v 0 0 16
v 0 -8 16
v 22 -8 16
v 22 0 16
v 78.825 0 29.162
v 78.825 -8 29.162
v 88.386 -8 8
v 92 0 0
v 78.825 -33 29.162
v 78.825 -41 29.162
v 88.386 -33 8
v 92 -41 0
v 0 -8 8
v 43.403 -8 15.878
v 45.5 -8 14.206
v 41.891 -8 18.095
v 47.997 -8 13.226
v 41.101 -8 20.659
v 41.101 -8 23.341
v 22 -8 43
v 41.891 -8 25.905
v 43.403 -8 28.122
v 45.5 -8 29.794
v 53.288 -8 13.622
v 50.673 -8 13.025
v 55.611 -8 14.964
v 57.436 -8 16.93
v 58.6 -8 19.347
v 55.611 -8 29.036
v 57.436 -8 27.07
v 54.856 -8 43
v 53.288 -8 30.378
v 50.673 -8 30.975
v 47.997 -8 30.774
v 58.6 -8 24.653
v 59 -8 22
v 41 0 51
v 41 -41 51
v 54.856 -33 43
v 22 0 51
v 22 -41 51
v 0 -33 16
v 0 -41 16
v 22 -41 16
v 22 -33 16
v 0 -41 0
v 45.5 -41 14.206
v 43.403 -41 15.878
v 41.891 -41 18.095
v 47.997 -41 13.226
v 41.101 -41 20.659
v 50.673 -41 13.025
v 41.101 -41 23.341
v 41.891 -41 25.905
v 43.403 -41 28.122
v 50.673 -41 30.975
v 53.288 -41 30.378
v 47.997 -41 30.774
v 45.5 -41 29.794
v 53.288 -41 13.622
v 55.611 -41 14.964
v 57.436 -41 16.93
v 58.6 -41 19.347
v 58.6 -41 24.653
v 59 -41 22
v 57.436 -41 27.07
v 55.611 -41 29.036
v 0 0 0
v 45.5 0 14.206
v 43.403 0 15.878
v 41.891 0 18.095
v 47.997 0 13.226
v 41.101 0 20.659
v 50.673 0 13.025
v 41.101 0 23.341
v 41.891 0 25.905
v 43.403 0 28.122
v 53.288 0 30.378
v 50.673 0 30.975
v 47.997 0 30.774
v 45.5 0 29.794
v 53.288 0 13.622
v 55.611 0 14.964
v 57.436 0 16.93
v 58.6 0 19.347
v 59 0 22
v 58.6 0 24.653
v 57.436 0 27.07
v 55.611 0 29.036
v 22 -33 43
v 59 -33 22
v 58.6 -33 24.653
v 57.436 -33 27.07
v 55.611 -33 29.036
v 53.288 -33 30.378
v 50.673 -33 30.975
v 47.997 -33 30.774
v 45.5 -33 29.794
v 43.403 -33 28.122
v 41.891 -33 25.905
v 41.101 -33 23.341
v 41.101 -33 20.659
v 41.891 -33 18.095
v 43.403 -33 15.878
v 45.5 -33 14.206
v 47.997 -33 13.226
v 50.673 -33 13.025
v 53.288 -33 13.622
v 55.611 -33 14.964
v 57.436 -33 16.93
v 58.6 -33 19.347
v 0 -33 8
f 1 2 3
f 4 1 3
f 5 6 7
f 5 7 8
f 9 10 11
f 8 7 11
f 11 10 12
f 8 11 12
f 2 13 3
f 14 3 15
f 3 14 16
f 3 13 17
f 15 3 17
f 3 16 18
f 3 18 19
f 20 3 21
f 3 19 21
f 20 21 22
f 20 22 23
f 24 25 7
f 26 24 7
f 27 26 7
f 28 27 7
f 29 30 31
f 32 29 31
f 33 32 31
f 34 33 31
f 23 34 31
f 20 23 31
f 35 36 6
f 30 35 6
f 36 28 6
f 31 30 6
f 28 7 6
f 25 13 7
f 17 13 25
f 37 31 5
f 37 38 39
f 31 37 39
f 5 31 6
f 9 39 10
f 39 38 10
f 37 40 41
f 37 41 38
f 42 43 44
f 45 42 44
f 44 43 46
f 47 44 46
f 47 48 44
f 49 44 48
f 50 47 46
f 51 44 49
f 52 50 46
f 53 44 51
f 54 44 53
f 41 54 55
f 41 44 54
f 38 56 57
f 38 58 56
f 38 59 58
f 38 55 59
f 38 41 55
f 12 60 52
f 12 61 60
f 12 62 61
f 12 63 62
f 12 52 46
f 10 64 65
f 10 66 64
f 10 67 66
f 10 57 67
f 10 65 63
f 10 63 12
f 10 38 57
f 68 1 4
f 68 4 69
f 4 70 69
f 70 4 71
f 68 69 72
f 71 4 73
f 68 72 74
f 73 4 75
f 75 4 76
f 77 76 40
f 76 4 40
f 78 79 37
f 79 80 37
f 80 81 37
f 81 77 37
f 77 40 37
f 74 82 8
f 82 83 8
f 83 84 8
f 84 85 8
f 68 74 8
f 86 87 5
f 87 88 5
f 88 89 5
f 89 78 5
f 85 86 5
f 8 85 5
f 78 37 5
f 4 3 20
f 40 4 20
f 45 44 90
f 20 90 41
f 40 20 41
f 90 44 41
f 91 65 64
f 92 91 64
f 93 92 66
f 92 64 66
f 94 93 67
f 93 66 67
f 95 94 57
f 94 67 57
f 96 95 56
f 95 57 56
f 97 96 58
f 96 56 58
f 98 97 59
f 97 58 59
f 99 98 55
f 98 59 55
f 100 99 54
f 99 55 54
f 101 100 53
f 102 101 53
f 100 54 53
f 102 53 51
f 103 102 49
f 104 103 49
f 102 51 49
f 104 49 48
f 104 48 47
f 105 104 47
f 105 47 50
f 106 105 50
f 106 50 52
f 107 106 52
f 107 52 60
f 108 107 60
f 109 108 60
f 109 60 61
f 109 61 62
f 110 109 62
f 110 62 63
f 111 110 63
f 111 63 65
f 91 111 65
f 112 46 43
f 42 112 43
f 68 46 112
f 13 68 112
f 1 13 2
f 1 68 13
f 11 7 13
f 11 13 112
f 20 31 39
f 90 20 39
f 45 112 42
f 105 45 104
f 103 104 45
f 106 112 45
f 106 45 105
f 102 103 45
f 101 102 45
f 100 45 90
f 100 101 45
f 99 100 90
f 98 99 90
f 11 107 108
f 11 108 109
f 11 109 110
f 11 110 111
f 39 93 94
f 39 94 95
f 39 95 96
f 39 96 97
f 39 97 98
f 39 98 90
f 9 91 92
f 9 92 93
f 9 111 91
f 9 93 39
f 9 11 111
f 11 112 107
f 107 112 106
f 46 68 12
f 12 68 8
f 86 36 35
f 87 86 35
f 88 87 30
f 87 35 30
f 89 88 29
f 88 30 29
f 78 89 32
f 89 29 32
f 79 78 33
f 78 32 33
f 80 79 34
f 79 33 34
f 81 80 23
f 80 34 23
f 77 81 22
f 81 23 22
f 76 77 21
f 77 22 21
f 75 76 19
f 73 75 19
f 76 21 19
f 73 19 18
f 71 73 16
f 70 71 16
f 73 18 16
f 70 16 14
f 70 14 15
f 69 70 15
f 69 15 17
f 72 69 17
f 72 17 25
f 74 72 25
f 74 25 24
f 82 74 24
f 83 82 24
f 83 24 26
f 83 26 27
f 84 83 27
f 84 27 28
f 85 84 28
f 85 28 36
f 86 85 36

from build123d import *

# Parameters (mm, degrees)
F0_W          = 92
F0_H          = 51
F1_DEPTH      = 41
F2_W          = 22
F2_H          = 35
F3_DEPTH      = 41.001
F5_DEPTH      = 41.001
F6_R          = 9
F7_DEPTH      = 41.001
F8_W          = 25
F8_H          = 35
F9_DEPTH      = 70.001
F9_DEPTH_BACK = 25.4


with BuildPart() as f1:
    # F0 (on Front) → F1 (new body)
    with BuildSketch(Plane.XZ):
        with Locations((46, 25.5)):
            Rectangle(F0_W, F0_H)
    extrude(amount=F1_DEPTH)

    # F2 (on face) → F3 (cut, through all)
    with BuildSketch(Plane.XZ.offset(41)):
        with Locations((11, 33.5)):
            Rectangle(F2_W, F2_H)
    extrude(amount=-F3_DEPTH, mode=Mode.SUBTRACT)

    # F4 (on face) → F5 (cut, through all)
    with BuildSketch(Plane.XZ.offset(41)):
        Polygon((92, 51), (41, 51), (78.8247816226, 29.1618521481), (92, 0), align=None)
    extrude(amount=-F5_DEPTH, mode=Mode.SUBTRACT)

    # F6 (on face) → F7 (cut, through all)
    with BuildSketch(Plane.XZ.offset(41)):
        with Locations((50, 22)):
            Circle(F6_R)
    extrude(amount=-F7_DEPTH, mode=Mode.SUBTRACT)

    # F8 (on face) → F9 (cut, two sides)
    with BuildSketch(Plane(origin=(22, 0, 0), x_dir=(0, -1, 0), z_dir=(-1, 0, 0))) as f9_sk:
        with Locations((20.5, 25.5)):
            Rectangle(F8_W, F8_H)
    extrude(amount=-F9_DEPTH, mode=Mode.SUBTRACT)
    extrude(f9_sk.sketch, amount=F9_DEPTH_BACK, mode=Mode.SUBTRACT)


solid = f1.part
